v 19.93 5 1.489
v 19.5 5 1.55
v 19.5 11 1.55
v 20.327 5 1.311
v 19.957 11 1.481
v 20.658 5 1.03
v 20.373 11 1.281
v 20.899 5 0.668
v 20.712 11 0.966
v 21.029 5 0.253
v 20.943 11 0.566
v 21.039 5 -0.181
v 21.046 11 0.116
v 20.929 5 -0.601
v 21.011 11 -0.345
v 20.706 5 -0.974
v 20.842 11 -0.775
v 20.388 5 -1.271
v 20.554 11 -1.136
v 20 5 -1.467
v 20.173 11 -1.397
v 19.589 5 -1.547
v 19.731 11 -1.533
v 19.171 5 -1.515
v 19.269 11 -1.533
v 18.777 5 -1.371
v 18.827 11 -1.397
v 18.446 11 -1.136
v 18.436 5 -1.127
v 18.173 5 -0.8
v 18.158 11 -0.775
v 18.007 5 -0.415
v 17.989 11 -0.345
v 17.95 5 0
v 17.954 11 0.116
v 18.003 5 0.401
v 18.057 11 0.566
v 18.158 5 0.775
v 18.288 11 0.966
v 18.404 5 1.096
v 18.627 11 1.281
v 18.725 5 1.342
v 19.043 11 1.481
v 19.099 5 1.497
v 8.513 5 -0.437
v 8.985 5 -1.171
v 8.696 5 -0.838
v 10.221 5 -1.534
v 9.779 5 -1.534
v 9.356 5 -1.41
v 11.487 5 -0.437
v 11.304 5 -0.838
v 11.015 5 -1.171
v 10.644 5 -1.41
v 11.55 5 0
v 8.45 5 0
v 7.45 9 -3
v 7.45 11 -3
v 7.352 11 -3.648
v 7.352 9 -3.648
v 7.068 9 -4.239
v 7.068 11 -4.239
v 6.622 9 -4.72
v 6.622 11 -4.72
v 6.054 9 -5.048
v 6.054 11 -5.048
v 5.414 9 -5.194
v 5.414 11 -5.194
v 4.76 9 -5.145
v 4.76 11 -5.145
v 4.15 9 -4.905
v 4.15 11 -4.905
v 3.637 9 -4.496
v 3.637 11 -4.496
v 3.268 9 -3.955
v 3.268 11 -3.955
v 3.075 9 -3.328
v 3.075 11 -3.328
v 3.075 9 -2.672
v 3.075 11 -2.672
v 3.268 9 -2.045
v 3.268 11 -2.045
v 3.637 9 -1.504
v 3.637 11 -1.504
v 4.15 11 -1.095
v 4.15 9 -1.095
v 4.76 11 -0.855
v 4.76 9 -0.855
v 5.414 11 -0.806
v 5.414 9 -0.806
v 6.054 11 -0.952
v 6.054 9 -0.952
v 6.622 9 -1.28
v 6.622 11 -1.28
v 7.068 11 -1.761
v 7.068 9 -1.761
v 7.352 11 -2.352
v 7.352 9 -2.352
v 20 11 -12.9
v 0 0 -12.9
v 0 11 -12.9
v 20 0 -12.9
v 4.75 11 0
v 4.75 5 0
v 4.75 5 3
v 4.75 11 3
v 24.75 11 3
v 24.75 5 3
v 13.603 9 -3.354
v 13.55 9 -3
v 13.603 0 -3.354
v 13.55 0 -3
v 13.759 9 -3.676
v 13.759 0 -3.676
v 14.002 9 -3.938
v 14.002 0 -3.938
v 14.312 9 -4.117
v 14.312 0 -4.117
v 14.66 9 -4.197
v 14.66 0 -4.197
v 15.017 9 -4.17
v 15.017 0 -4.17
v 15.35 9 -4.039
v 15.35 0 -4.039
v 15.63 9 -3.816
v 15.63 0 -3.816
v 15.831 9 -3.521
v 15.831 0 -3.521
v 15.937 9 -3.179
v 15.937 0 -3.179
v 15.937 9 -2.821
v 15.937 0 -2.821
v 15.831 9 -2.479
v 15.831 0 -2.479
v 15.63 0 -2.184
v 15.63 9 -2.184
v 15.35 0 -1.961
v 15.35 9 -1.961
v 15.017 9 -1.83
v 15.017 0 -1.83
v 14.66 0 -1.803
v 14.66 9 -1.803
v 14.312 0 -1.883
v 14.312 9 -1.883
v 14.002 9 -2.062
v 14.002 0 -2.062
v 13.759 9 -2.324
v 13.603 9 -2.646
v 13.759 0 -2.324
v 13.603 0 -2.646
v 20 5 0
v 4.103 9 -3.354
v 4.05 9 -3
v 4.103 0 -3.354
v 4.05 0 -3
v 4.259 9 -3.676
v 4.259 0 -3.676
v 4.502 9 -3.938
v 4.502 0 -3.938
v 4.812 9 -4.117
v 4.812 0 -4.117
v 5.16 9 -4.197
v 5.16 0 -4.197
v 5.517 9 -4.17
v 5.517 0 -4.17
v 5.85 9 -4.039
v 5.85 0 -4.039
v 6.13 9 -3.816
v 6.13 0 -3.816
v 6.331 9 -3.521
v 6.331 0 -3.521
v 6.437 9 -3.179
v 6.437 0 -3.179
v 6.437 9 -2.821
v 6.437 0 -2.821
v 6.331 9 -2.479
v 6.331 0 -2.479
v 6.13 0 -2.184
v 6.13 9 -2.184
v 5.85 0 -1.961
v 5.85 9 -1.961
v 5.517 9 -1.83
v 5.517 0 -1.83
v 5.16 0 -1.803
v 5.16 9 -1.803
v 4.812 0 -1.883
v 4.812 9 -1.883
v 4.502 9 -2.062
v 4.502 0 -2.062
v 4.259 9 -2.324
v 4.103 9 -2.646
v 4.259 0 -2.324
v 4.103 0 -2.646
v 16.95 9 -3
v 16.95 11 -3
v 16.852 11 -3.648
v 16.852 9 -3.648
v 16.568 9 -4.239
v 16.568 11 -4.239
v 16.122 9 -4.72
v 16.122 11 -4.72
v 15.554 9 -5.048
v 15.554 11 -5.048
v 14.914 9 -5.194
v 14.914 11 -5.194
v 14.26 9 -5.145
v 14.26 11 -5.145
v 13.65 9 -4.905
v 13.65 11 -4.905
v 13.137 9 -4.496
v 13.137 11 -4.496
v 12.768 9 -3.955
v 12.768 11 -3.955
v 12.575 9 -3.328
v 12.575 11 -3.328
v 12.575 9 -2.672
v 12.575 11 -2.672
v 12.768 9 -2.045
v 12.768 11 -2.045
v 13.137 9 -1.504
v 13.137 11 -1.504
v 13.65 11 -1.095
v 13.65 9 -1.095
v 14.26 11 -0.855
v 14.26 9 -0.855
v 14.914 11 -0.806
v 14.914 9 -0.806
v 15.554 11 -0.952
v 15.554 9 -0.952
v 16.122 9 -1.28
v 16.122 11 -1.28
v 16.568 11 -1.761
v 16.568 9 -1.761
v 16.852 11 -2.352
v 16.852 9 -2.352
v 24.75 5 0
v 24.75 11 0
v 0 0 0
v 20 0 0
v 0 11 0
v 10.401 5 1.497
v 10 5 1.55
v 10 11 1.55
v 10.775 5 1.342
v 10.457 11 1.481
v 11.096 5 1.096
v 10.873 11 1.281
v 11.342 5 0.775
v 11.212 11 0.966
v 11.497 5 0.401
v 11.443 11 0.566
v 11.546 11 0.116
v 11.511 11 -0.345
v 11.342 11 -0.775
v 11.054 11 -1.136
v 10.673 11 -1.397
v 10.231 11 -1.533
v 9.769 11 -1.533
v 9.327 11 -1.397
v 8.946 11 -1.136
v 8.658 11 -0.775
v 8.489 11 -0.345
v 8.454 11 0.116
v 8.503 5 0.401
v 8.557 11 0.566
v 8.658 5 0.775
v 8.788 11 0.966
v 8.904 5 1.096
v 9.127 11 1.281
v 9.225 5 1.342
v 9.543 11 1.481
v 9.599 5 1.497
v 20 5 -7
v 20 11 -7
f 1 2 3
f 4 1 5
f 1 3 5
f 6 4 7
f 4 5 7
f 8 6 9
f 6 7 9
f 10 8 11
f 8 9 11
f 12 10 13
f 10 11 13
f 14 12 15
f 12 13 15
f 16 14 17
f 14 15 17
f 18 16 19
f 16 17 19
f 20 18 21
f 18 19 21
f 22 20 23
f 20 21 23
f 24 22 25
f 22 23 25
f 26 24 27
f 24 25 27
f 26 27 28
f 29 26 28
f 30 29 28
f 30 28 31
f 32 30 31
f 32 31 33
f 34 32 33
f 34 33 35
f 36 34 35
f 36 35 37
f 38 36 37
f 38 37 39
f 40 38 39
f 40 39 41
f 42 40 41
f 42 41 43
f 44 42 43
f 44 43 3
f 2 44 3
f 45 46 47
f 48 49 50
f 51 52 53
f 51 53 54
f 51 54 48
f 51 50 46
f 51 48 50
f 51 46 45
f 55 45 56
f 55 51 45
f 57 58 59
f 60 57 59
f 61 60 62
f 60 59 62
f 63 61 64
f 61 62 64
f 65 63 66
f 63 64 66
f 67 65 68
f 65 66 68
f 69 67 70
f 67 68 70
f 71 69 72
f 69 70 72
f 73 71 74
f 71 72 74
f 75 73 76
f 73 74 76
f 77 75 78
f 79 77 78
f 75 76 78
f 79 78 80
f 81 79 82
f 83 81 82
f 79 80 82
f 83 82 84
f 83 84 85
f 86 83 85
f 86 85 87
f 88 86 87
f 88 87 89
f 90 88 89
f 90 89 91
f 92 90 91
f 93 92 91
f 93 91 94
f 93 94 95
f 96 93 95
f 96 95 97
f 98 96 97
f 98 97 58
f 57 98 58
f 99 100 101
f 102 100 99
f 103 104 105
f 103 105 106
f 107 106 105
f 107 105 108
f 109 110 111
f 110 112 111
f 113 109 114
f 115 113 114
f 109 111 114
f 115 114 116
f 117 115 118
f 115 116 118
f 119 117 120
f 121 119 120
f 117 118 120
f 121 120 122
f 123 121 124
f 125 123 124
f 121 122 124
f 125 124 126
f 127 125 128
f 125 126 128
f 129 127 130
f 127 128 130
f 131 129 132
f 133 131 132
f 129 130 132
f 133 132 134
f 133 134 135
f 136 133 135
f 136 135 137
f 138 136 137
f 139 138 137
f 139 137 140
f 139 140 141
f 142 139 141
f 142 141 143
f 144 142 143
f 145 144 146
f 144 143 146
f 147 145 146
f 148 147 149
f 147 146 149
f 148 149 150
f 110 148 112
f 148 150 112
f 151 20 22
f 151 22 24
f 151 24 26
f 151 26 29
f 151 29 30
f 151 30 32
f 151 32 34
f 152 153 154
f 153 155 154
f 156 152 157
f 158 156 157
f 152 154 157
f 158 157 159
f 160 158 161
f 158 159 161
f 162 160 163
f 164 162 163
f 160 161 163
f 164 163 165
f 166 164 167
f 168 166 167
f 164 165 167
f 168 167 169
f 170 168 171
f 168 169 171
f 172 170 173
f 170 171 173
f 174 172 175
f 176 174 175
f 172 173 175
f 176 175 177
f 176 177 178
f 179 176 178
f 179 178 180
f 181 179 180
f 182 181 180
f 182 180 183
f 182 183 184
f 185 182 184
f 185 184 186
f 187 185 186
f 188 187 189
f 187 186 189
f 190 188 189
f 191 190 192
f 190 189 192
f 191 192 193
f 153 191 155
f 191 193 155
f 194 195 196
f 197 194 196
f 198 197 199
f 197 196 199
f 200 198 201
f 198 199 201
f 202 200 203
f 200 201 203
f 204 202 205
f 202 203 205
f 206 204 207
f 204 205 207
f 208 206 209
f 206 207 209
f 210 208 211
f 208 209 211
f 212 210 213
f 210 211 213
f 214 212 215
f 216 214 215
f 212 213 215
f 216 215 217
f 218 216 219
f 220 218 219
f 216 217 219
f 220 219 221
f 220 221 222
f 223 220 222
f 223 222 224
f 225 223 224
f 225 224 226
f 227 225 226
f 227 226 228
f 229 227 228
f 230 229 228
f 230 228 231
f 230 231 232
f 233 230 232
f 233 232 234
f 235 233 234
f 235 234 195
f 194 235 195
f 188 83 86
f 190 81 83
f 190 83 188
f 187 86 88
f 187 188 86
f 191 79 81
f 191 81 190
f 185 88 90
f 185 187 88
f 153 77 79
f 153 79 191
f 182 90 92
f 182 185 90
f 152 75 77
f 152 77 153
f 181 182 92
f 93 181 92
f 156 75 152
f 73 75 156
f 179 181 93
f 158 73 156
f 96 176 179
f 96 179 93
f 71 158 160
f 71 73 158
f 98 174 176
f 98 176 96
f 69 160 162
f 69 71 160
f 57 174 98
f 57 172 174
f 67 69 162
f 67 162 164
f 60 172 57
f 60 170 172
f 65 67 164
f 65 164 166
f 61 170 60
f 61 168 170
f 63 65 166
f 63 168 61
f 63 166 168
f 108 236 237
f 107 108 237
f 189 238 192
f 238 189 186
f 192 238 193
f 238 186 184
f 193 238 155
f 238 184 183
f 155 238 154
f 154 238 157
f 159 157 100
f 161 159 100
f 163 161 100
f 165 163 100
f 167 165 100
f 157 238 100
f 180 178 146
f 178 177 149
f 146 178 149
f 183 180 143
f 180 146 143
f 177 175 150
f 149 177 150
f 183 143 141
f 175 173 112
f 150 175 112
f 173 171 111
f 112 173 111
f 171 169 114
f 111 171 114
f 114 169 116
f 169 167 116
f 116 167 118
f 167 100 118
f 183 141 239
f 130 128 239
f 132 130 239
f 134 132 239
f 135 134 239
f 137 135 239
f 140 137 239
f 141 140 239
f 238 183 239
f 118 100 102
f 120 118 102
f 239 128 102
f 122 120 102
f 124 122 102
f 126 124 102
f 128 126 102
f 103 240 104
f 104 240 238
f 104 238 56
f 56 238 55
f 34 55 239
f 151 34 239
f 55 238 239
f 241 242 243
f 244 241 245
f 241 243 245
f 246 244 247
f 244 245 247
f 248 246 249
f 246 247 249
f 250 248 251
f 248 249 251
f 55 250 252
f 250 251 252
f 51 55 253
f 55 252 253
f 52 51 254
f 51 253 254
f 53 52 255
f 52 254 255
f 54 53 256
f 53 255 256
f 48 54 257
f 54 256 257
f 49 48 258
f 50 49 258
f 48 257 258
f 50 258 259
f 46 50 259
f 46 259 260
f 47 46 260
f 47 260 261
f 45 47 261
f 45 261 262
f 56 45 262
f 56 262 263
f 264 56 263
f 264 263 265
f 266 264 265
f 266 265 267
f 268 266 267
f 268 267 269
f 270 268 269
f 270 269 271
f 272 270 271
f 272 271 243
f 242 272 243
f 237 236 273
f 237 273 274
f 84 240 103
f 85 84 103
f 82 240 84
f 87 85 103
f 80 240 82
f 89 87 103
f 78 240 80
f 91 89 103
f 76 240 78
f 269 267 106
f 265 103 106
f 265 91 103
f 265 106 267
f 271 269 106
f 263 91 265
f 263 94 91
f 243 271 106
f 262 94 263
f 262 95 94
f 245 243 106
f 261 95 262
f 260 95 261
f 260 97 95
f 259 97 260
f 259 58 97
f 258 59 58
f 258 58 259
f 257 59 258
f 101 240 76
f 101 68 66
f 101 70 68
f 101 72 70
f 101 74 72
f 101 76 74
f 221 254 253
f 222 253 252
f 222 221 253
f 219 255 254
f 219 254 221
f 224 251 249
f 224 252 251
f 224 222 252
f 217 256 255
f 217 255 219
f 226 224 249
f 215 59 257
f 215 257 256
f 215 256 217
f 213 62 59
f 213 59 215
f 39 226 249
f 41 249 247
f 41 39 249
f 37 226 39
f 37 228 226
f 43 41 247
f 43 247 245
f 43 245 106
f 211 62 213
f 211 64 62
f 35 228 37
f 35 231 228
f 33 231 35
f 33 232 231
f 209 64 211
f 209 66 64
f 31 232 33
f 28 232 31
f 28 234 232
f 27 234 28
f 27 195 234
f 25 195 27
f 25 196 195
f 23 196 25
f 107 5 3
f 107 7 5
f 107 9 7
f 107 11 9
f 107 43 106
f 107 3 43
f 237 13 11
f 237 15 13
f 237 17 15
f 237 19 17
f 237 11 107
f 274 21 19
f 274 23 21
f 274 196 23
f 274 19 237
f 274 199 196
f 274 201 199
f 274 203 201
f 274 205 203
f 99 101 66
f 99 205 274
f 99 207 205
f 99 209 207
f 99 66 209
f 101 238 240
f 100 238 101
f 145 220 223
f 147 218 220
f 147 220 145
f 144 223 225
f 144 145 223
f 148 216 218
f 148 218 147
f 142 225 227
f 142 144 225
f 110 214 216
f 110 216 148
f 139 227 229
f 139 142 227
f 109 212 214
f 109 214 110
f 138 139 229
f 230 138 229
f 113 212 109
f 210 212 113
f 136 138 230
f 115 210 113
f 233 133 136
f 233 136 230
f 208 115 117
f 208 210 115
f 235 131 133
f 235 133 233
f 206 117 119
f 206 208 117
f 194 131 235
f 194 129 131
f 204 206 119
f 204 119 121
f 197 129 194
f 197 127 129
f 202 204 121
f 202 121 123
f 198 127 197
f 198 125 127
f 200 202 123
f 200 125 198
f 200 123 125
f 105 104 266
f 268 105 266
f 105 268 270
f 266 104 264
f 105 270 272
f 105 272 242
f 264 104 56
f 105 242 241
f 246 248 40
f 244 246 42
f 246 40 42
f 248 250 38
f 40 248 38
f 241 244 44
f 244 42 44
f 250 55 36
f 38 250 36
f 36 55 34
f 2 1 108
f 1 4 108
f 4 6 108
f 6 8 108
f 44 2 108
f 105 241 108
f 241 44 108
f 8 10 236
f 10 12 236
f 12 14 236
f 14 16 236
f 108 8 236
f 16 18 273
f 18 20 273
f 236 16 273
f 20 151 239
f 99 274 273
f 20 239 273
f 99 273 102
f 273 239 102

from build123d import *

# Parameters (mm, degrees)
SKETCH1_W                      = 20
SKETCH1_H                      = 12.9
SKETCH1_R                      = 1.175
BOSS_EXTRUDE1_DEPTH            = 11
SKETCH2_W                      = 20
SKETCH2_H                      = 6
BOSS_EXTRUDE2_DEPTH            = 3
CBORE_FOR_M2_SHCS1_D           = 2.4
CBORE_FOR_M2_SHCS1_CBORE_D     = 4.4
CBORE_FOR_M2_SHCS1_CBORE_DEPTH = 2
CHAMFER1_SIZE2                 = 4.75
CHAMFER1_SIZE                  = 7
SKETCH5_R                      = 1.55
CUT_EXTRUDE1_DEPTH             = 6


with BuildPart() as part:
    # Sketch1 → Boss-Extrude1 (new body)
    with BuildSketch(Plane(origin=(0, 0, 0), x_dir=(1, 0, 0), z_dir=(0, 1, 0))):
        with Locations((10, 6.45)):
            Rectangle(SKETCH1_W, SKETCH1_H)
        with Locations(Location((5.25, 3, 0), (0, 0, 270))):
            Circle(SKETCH1_R, mode=Mode.SUBTRACT)
        with Locations(Location((14.75, 3, 0), (0, 0, 270))):
            Circle(SKETCH1_R, mode=Mode.SUBTRACT)
    extrude(amount=BOSS_EXTRUDE1_DEPTH)

    # Sketch2 → Boss-Extrude2 (add)
    with BuildSketch(Plane.XY):
        with Locations((14.75, 8)):
            Rectangle(SKETCH2_W, SKETCH2_H)
    extrude(amount=BOSS_EXTRUDE2_DEPTH)

    # CBORE for M2 SHCS1 (through all)
    with Locations(Plane(origin=(0, 11, 0), x_dir=(1, 0, 0), z_dir=(0, 1, 0))):
        with Locations((5.25, 3), (14.75, 3)):
            CounterBoreHole(CBORE_FOR_M2_SHCS1_D / 2, CBORE_FOR_M2_SHCS1_CBORE_D / 2, CBORE_FOR_M2_SHCS1_CBORE_DEPTH)

    # Chamfer1
    chamfer1_edges = [part.edges().sort_by_distance(p)[0] for p in [
        (20, 8, 0),
    ]]
    chamfer1_side = [part.faces().sort_by_distance(p)[0] for p in [
        (20, 8, -0.095),
    ]]
    chamfer(chamfer1_edges, length=CHAMFER1_SIZE - 0.0001, length2=CHAMFER1_SIZE2 - 0.0001, reference=chamfer1_side[0])  # a hair under: the kernel refuses the full size

    # Sketch5 → Cut-Extrude1 (cut)
    with BuildSketch(Plane(origin=(0, 11, 0), x_dir=(1, 0, 0), z_dir=(0, 1, 0))):
        with Locations(Location((10, 0, 0), (0, 0, 270))):
            Circle(SKETCH5_R)
        with Locations(Location((19.5, 0, 0), (0, 0, 270))):
            Circle(SKETCH5_R)
    extrude(amount=-CUT_EXTRUDE1_DEPTH, mode=Mode.SUBTRACT)


solid = part.part
